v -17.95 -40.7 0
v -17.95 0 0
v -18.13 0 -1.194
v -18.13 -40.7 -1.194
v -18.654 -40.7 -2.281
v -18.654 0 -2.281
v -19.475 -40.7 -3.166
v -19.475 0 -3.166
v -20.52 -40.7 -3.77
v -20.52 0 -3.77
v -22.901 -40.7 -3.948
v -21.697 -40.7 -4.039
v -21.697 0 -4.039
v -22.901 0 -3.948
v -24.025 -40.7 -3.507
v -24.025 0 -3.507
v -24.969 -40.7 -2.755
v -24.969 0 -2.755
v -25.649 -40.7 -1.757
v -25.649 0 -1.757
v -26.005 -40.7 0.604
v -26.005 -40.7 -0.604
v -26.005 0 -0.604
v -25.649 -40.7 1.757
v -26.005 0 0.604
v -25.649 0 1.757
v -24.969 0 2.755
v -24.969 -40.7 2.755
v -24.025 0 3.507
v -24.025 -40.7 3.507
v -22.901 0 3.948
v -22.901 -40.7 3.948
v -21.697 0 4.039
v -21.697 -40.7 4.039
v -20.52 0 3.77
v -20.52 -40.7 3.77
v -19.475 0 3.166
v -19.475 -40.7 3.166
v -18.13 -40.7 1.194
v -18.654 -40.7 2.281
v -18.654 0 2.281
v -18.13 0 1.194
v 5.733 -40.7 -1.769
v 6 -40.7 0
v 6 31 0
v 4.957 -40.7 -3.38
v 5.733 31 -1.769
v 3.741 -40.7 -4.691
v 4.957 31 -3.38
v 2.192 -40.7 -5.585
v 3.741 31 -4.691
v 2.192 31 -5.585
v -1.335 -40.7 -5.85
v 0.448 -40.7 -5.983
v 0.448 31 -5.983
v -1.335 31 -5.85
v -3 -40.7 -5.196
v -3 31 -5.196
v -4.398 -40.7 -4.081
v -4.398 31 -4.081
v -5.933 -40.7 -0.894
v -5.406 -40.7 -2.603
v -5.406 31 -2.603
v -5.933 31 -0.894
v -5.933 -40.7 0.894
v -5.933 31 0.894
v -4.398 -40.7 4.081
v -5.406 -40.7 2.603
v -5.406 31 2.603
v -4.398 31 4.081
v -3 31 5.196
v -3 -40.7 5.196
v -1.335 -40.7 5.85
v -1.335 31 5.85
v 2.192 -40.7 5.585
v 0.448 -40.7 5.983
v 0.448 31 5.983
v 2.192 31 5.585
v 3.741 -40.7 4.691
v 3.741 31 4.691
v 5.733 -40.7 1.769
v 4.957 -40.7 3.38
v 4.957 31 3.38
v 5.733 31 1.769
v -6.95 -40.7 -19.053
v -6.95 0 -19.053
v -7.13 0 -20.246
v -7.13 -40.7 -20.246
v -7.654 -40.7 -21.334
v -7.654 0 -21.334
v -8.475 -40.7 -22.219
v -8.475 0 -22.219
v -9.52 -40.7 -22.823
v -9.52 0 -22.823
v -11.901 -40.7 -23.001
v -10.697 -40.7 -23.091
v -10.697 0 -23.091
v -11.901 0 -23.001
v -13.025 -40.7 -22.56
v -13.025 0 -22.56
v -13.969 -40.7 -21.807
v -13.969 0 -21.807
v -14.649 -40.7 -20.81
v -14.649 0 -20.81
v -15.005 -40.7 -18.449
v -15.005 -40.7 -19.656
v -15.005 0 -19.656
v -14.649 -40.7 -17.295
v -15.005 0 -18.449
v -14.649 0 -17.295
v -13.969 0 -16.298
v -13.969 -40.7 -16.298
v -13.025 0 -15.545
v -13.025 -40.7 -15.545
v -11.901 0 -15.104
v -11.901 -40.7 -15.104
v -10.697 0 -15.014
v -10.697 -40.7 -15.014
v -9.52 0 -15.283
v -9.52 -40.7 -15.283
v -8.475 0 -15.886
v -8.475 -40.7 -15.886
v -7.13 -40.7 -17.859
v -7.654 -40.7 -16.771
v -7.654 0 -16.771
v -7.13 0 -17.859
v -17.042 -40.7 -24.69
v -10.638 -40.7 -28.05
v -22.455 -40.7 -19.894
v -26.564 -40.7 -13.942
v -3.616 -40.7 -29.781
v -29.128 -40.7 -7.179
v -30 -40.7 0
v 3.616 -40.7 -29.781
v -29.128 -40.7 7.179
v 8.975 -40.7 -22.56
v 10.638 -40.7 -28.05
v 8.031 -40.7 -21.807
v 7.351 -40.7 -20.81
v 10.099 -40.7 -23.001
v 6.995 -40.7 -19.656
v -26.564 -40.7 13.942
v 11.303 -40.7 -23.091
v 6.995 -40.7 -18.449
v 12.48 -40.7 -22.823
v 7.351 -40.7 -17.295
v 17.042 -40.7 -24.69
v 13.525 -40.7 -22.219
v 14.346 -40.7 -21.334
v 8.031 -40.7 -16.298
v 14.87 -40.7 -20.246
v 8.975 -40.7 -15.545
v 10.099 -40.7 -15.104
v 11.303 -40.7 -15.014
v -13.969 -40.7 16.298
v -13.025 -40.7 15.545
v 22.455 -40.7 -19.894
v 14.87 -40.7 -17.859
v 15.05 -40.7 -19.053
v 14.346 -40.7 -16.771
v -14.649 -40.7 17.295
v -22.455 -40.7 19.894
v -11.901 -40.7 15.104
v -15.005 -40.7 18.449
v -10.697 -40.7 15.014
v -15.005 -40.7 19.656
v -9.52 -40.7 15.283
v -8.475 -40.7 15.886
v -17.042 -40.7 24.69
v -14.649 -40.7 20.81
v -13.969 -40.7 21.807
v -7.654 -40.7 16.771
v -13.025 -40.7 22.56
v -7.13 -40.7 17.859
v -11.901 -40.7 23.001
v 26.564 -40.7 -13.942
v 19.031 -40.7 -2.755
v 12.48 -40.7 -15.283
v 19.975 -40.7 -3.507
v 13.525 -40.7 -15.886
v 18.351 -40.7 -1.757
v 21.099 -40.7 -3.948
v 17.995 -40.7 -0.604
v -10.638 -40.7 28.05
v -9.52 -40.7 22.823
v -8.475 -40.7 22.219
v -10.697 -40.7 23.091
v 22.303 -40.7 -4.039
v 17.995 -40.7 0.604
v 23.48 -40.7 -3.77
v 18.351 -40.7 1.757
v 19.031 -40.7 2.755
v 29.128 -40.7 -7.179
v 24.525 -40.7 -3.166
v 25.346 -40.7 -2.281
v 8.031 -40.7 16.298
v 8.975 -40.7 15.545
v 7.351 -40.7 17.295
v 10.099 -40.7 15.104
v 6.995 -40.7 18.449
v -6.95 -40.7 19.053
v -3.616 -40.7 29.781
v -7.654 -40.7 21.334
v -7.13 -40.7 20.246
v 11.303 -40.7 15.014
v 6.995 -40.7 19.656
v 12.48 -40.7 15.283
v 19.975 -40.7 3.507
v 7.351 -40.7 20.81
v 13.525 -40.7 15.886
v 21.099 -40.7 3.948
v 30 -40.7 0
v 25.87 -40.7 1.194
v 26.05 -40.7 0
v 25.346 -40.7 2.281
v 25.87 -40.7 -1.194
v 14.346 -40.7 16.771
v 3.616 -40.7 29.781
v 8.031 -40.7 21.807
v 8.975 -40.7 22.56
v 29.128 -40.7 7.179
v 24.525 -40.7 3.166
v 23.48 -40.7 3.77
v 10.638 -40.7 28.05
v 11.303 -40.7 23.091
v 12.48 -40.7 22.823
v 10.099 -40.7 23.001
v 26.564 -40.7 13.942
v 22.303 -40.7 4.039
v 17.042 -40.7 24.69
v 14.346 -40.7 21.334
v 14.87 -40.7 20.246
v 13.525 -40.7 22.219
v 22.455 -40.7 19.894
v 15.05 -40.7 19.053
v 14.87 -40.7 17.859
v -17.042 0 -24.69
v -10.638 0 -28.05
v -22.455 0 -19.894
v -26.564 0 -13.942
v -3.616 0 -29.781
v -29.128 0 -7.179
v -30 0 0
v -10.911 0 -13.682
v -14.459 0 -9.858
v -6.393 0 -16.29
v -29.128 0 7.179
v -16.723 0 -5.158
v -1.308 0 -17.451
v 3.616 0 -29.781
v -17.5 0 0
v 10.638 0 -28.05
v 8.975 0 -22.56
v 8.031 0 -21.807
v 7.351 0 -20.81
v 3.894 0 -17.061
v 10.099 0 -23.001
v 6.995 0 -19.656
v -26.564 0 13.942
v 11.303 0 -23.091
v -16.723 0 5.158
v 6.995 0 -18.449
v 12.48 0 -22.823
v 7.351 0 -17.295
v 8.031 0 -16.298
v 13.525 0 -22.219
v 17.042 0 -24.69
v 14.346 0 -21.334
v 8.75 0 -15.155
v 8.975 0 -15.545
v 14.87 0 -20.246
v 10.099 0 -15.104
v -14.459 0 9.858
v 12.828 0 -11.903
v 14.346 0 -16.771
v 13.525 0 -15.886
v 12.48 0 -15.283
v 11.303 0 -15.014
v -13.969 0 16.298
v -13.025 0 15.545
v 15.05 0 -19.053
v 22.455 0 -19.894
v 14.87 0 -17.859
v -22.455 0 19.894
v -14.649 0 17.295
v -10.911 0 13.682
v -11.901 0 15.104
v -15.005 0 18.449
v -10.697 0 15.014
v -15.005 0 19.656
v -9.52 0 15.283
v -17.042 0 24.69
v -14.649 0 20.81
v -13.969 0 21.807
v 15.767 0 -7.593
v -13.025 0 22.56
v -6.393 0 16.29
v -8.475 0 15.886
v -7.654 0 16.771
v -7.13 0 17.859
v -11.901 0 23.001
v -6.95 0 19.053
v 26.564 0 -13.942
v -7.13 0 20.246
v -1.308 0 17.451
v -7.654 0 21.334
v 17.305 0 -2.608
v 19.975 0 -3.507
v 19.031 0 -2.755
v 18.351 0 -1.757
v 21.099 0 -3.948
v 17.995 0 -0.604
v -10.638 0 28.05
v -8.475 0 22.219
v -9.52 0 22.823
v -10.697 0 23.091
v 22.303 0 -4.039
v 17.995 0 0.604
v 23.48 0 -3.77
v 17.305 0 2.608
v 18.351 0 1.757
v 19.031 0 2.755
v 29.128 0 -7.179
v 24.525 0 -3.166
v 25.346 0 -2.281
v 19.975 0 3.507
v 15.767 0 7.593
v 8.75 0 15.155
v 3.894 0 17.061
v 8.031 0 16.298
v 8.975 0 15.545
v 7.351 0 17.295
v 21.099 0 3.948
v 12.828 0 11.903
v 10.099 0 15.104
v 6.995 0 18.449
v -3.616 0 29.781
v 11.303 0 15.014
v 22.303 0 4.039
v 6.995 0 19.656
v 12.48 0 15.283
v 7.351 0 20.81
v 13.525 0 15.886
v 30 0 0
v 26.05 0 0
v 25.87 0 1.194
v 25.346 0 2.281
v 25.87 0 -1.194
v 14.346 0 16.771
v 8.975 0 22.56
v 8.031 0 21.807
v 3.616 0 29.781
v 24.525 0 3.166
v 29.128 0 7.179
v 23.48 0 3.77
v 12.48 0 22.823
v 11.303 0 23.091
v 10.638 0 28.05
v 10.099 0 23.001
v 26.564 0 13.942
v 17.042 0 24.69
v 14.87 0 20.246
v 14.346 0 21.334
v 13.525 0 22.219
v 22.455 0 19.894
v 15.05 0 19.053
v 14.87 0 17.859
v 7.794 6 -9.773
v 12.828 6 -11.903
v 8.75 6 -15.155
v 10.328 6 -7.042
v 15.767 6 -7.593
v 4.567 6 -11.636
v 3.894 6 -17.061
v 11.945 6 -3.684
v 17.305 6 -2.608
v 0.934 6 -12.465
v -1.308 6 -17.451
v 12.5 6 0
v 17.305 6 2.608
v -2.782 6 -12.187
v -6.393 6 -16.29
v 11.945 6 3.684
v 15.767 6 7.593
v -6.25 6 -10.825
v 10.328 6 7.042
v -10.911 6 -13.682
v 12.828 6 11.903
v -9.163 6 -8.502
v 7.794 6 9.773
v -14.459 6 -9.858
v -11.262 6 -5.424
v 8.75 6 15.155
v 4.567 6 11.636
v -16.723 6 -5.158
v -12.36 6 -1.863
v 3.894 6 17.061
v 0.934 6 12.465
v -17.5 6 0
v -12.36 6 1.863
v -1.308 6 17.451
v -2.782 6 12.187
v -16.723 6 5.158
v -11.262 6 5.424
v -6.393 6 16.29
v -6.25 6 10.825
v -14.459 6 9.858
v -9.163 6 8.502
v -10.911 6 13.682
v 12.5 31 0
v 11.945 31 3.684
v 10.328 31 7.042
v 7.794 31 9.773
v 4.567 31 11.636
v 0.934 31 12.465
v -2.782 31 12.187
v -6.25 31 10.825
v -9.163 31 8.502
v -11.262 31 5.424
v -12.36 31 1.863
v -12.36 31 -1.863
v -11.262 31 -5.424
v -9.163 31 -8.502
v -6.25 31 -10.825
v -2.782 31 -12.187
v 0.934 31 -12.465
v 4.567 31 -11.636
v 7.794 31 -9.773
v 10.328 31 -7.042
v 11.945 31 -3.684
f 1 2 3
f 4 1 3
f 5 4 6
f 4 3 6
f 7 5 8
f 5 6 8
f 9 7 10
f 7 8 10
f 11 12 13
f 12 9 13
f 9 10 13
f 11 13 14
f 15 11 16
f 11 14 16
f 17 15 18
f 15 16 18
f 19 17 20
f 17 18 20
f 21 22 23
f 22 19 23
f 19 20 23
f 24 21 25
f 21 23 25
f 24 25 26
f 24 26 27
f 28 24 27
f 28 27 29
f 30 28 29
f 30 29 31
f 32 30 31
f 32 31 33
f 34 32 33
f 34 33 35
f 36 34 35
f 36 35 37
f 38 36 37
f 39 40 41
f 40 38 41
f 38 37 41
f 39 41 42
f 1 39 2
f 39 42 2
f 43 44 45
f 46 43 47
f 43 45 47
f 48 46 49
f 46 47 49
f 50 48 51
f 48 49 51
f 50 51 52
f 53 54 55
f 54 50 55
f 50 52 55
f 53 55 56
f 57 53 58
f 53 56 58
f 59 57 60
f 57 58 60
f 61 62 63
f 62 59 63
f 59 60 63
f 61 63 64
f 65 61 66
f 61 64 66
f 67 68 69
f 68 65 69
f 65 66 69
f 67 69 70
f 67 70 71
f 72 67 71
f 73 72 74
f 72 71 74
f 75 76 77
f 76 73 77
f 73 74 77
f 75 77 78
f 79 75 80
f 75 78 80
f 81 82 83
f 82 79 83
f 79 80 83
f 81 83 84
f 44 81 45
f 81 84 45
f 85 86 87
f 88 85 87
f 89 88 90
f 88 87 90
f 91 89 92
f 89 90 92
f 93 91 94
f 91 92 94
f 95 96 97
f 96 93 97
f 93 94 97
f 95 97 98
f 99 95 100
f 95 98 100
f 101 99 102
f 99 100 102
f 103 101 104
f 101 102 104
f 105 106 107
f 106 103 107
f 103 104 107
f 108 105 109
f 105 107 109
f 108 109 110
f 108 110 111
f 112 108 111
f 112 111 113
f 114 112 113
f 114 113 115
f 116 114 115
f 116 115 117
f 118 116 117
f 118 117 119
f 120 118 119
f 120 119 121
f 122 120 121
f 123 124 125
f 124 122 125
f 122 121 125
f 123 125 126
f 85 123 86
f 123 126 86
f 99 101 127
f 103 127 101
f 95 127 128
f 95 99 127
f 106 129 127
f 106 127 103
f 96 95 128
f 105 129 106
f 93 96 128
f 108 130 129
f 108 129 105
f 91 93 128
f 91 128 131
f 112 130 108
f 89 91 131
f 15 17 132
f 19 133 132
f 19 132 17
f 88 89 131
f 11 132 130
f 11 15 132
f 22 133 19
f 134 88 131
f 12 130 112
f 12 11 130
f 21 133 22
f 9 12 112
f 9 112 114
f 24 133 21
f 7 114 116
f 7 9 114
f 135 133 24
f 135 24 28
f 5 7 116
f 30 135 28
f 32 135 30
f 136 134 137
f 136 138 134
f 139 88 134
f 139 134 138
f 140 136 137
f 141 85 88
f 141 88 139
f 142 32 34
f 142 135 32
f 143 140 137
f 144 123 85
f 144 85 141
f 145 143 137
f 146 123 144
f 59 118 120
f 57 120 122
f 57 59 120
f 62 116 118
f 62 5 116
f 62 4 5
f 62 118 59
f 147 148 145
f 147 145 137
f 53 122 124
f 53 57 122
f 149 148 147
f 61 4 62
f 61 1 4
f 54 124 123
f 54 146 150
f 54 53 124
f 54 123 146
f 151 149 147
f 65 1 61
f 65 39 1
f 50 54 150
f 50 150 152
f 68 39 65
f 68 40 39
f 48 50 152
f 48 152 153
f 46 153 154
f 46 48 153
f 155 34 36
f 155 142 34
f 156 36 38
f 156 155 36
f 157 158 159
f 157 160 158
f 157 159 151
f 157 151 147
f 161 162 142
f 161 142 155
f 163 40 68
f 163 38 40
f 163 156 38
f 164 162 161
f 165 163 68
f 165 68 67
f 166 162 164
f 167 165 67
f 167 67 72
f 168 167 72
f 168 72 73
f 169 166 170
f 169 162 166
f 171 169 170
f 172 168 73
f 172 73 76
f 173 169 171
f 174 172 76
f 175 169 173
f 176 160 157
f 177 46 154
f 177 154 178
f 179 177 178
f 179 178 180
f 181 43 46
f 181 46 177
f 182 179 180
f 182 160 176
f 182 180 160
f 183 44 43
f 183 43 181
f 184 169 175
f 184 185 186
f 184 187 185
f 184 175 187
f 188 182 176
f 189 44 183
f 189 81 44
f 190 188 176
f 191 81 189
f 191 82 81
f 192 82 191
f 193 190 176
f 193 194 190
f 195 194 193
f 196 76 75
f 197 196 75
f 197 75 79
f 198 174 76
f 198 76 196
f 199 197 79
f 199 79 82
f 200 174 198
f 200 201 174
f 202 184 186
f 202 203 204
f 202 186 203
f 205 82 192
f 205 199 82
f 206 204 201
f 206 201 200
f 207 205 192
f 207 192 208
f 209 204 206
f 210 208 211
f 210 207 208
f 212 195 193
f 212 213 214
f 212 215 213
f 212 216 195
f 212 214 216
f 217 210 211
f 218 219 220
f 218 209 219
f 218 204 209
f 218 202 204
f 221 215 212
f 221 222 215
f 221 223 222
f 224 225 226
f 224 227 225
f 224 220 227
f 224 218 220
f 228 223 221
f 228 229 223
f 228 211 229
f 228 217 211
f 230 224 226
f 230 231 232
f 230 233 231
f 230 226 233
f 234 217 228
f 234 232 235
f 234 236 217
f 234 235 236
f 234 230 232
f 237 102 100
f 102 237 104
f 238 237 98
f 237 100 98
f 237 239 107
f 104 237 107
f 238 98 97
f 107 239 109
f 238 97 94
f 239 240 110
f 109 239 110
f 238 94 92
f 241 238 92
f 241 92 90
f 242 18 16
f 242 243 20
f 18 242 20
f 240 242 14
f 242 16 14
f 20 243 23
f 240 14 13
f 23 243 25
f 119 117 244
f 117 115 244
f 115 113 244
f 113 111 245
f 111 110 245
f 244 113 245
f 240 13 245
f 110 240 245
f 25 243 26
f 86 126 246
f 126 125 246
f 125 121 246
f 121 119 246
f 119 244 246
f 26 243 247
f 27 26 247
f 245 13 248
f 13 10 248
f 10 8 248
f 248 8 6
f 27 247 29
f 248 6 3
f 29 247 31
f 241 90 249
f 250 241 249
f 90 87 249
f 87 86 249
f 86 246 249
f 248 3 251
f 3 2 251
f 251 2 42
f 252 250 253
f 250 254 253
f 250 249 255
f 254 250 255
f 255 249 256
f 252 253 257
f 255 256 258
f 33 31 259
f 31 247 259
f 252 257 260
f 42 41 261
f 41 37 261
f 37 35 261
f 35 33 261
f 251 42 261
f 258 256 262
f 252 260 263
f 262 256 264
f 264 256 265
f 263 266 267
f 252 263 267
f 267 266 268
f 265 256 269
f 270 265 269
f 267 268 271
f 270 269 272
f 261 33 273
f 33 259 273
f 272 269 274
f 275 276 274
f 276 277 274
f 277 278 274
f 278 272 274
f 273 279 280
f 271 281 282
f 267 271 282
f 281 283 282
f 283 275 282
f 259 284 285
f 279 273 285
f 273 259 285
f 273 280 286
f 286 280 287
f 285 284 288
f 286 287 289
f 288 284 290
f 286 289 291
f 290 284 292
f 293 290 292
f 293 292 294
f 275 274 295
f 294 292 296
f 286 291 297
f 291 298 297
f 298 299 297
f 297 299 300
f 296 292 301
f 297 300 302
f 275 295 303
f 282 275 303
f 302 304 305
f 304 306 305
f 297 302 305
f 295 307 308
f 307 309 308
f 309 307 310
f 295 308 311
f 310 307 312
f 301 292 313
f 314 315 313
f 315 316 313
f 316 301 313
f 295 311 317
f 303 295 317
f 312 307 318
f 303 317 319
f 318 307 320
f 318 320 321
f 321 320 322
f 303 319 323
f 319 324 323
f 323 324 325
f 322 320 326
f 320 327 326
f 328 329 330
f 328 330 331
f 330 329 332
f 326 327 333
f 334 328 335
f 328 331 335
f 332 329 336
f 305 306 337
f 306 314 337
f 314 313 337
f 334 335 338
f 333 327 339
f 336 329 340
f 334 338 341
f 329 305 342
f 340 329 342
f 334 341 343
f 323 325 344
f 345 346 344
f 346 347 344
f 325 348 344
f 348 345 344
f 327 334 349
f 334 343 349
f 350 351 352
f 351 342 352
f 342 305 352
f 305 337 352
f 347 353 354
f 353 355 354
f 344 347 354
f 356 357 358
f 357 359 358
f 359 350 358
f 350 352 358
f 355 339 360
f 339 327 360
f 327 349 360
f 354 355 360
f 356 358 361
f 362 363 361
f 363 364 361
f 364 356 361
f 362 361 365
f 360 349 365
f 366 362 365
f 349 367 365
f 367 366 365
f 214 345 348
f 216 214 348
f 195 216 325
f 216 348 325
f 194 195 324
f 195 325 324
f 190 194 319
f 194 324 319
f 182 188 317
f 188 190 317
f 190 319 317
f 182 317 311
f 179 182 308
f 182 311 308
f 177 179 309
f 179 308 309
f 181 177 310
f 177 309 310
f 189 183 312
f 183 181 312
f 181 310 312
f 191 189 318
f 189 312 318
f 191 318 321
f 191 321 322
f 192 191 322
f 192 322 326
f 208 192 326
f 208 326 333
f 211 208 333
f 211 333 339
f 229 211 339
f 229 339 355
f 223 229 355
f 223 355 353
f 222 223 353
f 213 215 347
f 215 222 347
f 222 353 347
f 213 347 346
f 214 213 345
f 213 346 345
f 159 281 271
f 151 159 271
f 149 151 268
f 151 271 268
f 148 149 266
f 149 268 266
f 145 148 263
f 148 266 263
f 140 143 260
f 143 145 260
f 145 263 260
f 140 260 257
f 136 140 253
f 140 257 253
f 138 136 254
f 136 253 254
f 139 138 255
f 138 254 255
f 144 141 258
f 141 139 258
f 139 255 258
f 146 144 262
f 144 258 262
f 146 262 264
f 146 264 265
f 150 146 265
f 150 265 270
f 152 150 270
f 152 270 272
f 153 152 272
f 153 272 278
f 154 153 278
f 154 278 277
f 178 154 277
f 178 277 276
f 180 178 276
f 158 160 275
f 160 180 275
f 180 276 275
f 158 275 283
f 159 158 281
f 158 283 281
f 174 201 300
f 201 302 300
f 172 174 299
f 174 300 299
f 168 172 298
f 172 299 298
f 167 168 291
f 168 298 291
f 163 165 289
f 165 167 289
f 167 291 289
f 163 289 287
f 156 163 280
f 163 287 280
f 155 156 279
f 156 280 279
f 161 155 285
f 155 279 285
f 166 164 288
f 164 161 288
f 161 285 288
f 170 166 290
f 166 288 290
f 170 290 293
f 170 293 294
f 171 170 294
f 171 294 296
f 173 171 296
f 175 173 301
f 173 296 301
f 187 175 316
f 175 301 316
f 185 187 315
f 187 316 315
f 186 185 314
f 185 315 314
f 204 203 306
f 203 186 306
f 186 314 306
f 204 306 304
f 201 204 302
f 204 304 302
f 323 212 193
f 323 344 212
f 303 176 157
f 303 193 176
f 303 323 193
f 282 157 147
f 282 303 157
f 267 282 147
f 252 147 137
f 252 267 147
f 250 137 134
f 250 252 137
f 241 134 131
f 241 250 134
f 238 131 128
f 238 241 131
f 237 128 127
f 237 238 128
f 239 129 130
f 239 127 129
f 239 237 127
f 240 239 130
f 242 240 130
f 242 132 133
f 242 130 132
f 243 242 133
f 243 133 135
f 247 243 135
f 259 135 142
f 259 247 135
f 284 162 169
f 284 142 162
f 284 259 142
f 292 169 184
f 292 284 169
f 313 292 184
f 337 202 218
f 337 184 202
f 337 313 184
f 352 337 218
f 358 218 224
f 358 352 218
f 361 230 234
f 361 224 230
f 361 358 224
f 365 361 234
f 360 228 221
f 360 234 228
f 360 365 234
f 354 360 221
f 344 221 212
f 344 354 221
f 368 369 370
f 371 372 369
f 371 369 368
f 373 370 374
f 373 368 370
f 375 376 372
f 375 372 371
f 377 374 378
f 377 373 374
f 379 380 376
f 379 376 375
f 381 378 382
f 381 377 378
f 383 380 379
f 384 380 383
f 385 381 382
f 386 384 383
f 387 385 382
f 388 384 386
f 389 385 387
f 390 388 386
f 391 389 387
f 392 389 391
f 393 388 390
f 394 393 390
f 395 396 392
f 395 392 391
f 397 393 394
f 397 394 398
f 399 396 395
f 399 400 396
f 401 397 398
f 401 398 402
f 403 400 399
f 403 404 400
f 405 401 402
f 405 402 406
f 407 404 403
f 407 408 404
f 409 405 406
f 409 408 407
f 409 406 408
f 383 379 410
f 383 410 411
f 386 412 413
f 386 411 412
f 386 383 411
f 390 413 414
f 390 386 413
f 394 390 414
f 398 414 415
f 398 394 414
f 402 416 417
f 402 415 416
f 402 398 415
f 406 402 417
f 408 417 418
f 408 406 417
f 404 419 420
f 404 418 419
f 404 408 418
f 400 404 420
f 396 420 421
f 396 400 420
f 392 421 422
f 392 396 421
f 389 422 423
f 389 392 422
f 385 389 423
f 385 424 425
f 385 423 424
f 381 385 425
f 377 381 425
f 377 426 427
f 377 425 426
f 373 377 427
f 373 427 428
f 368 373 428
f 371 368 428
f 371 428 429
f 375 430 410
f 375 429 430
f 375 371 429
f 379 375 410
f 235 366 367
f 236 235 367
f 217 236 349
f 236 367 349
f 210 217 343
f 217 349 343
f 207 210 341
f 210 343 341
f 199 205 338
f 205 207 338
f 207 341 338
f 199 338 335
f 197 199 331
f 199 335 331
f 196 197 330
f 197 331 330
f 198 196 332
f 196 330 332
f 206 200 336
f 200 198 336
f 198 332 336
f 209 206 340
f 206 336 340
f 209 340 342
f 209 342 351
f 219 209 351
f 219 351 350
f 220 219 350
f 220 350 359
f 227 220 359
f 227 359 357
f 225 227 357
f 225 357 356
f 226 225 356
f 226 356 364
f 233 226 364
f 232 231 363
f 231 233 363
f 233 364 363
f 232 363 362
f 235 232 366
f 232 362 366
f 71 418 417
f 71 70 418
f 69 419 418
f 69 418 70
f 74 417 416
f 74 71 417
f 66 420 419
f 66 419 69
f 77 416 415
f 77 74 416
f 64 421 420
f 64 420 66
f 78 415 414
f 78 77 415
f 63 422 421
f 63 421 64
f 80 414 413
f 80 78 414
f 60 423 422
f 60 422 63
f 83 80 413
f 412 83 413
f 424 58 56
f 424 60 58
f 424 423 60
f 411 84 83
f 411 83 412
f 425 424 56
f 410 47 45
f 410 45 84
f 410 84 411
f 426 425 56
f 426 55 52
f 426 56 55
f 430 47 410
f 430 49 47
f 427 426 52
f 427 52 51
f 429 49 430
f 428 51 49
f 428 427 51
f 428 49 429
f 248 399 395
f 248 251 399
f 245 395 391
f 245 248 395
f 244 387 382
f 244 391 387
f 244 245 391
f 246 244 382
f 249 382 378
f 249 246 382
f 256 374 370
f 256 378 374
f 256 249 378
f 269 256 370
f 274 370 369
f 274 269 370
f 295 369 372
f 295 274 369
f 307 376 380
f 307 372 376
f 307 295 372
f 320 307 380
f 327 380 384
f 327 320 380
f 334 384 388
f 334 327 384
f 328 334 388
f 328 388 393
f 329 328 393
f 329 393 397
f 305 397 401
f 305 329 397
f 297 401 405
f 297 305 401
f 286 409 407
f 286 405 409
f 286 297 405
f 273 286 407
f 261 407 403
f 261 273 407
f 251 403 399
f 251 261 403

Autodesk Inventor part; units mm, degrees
ref_plane "YZ Plane" through (0, 0, 0) normal (1, 0, 0) x (0, 1, 0)
ref_plane "XZ Plane" through (0, 0, 0) normal (0, 1, 0) x (-1, 0, 0)
ref_plane "XY Plane" through (0, 0, 0) normal (0, 0, 1) x (1, 0, 0)
sketch "Sketch1" plane through (0, 0, 0) normal (0, 1, 0) x (-1, 0, 0)
  circle A0 centre (0, 0) radius 17.5
  dimension "d0" = 35
extrude "Extrusion1" add sketch "Sketch1" along normal blind 6
sketch "Sketch2" plane through (0, 6, 0) normal (0, 1, 0) x (1, 0, 0)
  circle A0 centre (0, 0) radius 12.5
  dimension "d3" = 25
extrude "Extrusion2" add sketch "Sketch2" along normal blind 25
sketch "Sketch3" plane through (0, 31, 0) normal (0, 1, 0) x (1, 0, 0)
  circle A0 centre (0, 0) radius 6
extrude "Extrusion3" cut sketch "Sketch3" against normal blind 100
sketch "Sketch4" plane through (0, 0, 0) normal (0, -1, 0) x (1, 0, 0)
  circle A0 centre (0, 0) radius 6
  circle A1 centre (0, 0) radius 30
  circle A2 centre (22, 0) radius 4.05
  circle A3 centre (11, 19.0526) radius 4.05
  circle A4 centre (-11, 19.0526) radius 4.05
  circle A5 centre (-22, 0) radius 4.05
  circle A6 centre (-11, -19.0526) radius 4.05
  circle A7 centre (11, -19.0526) radius 4.05
  dimension "d8" = 60
  dimension "d11" = 12
  dimension "d12" = 22
  dimension "d13" = 8.1
  dimension "d16" = 360
extrude "Extrusion4" add sketch "Sketch4" along normal blind 24
sketch "Sketch5" plane through (0, -24, 0) normal (0, -1, 0) x (1, 0, 0)
  circle A0 centre (0, 0) radius 30 projected
  circle A1 centre (11, -19.0526) radius 4.05 projected
  circle A2 centre (-11, -19.0526) radius 4.05 projected
  circle A3 centre (-22, 0) radius 4.05 projected
  circle A4 centre (-11, 19.0526) radius 4.05 projected
  circle A5 centre (11, 19.0526) radius 4.05 projected
  circle A6 centre (22, 0) radius 4.05 projected
  circle A7 centre (0, 0) radius 6 projected
extrude "Extrusion5" add sketch "Sketch5" along normal blind 16.7
properties part number "MiniPodsipnikNatag"
